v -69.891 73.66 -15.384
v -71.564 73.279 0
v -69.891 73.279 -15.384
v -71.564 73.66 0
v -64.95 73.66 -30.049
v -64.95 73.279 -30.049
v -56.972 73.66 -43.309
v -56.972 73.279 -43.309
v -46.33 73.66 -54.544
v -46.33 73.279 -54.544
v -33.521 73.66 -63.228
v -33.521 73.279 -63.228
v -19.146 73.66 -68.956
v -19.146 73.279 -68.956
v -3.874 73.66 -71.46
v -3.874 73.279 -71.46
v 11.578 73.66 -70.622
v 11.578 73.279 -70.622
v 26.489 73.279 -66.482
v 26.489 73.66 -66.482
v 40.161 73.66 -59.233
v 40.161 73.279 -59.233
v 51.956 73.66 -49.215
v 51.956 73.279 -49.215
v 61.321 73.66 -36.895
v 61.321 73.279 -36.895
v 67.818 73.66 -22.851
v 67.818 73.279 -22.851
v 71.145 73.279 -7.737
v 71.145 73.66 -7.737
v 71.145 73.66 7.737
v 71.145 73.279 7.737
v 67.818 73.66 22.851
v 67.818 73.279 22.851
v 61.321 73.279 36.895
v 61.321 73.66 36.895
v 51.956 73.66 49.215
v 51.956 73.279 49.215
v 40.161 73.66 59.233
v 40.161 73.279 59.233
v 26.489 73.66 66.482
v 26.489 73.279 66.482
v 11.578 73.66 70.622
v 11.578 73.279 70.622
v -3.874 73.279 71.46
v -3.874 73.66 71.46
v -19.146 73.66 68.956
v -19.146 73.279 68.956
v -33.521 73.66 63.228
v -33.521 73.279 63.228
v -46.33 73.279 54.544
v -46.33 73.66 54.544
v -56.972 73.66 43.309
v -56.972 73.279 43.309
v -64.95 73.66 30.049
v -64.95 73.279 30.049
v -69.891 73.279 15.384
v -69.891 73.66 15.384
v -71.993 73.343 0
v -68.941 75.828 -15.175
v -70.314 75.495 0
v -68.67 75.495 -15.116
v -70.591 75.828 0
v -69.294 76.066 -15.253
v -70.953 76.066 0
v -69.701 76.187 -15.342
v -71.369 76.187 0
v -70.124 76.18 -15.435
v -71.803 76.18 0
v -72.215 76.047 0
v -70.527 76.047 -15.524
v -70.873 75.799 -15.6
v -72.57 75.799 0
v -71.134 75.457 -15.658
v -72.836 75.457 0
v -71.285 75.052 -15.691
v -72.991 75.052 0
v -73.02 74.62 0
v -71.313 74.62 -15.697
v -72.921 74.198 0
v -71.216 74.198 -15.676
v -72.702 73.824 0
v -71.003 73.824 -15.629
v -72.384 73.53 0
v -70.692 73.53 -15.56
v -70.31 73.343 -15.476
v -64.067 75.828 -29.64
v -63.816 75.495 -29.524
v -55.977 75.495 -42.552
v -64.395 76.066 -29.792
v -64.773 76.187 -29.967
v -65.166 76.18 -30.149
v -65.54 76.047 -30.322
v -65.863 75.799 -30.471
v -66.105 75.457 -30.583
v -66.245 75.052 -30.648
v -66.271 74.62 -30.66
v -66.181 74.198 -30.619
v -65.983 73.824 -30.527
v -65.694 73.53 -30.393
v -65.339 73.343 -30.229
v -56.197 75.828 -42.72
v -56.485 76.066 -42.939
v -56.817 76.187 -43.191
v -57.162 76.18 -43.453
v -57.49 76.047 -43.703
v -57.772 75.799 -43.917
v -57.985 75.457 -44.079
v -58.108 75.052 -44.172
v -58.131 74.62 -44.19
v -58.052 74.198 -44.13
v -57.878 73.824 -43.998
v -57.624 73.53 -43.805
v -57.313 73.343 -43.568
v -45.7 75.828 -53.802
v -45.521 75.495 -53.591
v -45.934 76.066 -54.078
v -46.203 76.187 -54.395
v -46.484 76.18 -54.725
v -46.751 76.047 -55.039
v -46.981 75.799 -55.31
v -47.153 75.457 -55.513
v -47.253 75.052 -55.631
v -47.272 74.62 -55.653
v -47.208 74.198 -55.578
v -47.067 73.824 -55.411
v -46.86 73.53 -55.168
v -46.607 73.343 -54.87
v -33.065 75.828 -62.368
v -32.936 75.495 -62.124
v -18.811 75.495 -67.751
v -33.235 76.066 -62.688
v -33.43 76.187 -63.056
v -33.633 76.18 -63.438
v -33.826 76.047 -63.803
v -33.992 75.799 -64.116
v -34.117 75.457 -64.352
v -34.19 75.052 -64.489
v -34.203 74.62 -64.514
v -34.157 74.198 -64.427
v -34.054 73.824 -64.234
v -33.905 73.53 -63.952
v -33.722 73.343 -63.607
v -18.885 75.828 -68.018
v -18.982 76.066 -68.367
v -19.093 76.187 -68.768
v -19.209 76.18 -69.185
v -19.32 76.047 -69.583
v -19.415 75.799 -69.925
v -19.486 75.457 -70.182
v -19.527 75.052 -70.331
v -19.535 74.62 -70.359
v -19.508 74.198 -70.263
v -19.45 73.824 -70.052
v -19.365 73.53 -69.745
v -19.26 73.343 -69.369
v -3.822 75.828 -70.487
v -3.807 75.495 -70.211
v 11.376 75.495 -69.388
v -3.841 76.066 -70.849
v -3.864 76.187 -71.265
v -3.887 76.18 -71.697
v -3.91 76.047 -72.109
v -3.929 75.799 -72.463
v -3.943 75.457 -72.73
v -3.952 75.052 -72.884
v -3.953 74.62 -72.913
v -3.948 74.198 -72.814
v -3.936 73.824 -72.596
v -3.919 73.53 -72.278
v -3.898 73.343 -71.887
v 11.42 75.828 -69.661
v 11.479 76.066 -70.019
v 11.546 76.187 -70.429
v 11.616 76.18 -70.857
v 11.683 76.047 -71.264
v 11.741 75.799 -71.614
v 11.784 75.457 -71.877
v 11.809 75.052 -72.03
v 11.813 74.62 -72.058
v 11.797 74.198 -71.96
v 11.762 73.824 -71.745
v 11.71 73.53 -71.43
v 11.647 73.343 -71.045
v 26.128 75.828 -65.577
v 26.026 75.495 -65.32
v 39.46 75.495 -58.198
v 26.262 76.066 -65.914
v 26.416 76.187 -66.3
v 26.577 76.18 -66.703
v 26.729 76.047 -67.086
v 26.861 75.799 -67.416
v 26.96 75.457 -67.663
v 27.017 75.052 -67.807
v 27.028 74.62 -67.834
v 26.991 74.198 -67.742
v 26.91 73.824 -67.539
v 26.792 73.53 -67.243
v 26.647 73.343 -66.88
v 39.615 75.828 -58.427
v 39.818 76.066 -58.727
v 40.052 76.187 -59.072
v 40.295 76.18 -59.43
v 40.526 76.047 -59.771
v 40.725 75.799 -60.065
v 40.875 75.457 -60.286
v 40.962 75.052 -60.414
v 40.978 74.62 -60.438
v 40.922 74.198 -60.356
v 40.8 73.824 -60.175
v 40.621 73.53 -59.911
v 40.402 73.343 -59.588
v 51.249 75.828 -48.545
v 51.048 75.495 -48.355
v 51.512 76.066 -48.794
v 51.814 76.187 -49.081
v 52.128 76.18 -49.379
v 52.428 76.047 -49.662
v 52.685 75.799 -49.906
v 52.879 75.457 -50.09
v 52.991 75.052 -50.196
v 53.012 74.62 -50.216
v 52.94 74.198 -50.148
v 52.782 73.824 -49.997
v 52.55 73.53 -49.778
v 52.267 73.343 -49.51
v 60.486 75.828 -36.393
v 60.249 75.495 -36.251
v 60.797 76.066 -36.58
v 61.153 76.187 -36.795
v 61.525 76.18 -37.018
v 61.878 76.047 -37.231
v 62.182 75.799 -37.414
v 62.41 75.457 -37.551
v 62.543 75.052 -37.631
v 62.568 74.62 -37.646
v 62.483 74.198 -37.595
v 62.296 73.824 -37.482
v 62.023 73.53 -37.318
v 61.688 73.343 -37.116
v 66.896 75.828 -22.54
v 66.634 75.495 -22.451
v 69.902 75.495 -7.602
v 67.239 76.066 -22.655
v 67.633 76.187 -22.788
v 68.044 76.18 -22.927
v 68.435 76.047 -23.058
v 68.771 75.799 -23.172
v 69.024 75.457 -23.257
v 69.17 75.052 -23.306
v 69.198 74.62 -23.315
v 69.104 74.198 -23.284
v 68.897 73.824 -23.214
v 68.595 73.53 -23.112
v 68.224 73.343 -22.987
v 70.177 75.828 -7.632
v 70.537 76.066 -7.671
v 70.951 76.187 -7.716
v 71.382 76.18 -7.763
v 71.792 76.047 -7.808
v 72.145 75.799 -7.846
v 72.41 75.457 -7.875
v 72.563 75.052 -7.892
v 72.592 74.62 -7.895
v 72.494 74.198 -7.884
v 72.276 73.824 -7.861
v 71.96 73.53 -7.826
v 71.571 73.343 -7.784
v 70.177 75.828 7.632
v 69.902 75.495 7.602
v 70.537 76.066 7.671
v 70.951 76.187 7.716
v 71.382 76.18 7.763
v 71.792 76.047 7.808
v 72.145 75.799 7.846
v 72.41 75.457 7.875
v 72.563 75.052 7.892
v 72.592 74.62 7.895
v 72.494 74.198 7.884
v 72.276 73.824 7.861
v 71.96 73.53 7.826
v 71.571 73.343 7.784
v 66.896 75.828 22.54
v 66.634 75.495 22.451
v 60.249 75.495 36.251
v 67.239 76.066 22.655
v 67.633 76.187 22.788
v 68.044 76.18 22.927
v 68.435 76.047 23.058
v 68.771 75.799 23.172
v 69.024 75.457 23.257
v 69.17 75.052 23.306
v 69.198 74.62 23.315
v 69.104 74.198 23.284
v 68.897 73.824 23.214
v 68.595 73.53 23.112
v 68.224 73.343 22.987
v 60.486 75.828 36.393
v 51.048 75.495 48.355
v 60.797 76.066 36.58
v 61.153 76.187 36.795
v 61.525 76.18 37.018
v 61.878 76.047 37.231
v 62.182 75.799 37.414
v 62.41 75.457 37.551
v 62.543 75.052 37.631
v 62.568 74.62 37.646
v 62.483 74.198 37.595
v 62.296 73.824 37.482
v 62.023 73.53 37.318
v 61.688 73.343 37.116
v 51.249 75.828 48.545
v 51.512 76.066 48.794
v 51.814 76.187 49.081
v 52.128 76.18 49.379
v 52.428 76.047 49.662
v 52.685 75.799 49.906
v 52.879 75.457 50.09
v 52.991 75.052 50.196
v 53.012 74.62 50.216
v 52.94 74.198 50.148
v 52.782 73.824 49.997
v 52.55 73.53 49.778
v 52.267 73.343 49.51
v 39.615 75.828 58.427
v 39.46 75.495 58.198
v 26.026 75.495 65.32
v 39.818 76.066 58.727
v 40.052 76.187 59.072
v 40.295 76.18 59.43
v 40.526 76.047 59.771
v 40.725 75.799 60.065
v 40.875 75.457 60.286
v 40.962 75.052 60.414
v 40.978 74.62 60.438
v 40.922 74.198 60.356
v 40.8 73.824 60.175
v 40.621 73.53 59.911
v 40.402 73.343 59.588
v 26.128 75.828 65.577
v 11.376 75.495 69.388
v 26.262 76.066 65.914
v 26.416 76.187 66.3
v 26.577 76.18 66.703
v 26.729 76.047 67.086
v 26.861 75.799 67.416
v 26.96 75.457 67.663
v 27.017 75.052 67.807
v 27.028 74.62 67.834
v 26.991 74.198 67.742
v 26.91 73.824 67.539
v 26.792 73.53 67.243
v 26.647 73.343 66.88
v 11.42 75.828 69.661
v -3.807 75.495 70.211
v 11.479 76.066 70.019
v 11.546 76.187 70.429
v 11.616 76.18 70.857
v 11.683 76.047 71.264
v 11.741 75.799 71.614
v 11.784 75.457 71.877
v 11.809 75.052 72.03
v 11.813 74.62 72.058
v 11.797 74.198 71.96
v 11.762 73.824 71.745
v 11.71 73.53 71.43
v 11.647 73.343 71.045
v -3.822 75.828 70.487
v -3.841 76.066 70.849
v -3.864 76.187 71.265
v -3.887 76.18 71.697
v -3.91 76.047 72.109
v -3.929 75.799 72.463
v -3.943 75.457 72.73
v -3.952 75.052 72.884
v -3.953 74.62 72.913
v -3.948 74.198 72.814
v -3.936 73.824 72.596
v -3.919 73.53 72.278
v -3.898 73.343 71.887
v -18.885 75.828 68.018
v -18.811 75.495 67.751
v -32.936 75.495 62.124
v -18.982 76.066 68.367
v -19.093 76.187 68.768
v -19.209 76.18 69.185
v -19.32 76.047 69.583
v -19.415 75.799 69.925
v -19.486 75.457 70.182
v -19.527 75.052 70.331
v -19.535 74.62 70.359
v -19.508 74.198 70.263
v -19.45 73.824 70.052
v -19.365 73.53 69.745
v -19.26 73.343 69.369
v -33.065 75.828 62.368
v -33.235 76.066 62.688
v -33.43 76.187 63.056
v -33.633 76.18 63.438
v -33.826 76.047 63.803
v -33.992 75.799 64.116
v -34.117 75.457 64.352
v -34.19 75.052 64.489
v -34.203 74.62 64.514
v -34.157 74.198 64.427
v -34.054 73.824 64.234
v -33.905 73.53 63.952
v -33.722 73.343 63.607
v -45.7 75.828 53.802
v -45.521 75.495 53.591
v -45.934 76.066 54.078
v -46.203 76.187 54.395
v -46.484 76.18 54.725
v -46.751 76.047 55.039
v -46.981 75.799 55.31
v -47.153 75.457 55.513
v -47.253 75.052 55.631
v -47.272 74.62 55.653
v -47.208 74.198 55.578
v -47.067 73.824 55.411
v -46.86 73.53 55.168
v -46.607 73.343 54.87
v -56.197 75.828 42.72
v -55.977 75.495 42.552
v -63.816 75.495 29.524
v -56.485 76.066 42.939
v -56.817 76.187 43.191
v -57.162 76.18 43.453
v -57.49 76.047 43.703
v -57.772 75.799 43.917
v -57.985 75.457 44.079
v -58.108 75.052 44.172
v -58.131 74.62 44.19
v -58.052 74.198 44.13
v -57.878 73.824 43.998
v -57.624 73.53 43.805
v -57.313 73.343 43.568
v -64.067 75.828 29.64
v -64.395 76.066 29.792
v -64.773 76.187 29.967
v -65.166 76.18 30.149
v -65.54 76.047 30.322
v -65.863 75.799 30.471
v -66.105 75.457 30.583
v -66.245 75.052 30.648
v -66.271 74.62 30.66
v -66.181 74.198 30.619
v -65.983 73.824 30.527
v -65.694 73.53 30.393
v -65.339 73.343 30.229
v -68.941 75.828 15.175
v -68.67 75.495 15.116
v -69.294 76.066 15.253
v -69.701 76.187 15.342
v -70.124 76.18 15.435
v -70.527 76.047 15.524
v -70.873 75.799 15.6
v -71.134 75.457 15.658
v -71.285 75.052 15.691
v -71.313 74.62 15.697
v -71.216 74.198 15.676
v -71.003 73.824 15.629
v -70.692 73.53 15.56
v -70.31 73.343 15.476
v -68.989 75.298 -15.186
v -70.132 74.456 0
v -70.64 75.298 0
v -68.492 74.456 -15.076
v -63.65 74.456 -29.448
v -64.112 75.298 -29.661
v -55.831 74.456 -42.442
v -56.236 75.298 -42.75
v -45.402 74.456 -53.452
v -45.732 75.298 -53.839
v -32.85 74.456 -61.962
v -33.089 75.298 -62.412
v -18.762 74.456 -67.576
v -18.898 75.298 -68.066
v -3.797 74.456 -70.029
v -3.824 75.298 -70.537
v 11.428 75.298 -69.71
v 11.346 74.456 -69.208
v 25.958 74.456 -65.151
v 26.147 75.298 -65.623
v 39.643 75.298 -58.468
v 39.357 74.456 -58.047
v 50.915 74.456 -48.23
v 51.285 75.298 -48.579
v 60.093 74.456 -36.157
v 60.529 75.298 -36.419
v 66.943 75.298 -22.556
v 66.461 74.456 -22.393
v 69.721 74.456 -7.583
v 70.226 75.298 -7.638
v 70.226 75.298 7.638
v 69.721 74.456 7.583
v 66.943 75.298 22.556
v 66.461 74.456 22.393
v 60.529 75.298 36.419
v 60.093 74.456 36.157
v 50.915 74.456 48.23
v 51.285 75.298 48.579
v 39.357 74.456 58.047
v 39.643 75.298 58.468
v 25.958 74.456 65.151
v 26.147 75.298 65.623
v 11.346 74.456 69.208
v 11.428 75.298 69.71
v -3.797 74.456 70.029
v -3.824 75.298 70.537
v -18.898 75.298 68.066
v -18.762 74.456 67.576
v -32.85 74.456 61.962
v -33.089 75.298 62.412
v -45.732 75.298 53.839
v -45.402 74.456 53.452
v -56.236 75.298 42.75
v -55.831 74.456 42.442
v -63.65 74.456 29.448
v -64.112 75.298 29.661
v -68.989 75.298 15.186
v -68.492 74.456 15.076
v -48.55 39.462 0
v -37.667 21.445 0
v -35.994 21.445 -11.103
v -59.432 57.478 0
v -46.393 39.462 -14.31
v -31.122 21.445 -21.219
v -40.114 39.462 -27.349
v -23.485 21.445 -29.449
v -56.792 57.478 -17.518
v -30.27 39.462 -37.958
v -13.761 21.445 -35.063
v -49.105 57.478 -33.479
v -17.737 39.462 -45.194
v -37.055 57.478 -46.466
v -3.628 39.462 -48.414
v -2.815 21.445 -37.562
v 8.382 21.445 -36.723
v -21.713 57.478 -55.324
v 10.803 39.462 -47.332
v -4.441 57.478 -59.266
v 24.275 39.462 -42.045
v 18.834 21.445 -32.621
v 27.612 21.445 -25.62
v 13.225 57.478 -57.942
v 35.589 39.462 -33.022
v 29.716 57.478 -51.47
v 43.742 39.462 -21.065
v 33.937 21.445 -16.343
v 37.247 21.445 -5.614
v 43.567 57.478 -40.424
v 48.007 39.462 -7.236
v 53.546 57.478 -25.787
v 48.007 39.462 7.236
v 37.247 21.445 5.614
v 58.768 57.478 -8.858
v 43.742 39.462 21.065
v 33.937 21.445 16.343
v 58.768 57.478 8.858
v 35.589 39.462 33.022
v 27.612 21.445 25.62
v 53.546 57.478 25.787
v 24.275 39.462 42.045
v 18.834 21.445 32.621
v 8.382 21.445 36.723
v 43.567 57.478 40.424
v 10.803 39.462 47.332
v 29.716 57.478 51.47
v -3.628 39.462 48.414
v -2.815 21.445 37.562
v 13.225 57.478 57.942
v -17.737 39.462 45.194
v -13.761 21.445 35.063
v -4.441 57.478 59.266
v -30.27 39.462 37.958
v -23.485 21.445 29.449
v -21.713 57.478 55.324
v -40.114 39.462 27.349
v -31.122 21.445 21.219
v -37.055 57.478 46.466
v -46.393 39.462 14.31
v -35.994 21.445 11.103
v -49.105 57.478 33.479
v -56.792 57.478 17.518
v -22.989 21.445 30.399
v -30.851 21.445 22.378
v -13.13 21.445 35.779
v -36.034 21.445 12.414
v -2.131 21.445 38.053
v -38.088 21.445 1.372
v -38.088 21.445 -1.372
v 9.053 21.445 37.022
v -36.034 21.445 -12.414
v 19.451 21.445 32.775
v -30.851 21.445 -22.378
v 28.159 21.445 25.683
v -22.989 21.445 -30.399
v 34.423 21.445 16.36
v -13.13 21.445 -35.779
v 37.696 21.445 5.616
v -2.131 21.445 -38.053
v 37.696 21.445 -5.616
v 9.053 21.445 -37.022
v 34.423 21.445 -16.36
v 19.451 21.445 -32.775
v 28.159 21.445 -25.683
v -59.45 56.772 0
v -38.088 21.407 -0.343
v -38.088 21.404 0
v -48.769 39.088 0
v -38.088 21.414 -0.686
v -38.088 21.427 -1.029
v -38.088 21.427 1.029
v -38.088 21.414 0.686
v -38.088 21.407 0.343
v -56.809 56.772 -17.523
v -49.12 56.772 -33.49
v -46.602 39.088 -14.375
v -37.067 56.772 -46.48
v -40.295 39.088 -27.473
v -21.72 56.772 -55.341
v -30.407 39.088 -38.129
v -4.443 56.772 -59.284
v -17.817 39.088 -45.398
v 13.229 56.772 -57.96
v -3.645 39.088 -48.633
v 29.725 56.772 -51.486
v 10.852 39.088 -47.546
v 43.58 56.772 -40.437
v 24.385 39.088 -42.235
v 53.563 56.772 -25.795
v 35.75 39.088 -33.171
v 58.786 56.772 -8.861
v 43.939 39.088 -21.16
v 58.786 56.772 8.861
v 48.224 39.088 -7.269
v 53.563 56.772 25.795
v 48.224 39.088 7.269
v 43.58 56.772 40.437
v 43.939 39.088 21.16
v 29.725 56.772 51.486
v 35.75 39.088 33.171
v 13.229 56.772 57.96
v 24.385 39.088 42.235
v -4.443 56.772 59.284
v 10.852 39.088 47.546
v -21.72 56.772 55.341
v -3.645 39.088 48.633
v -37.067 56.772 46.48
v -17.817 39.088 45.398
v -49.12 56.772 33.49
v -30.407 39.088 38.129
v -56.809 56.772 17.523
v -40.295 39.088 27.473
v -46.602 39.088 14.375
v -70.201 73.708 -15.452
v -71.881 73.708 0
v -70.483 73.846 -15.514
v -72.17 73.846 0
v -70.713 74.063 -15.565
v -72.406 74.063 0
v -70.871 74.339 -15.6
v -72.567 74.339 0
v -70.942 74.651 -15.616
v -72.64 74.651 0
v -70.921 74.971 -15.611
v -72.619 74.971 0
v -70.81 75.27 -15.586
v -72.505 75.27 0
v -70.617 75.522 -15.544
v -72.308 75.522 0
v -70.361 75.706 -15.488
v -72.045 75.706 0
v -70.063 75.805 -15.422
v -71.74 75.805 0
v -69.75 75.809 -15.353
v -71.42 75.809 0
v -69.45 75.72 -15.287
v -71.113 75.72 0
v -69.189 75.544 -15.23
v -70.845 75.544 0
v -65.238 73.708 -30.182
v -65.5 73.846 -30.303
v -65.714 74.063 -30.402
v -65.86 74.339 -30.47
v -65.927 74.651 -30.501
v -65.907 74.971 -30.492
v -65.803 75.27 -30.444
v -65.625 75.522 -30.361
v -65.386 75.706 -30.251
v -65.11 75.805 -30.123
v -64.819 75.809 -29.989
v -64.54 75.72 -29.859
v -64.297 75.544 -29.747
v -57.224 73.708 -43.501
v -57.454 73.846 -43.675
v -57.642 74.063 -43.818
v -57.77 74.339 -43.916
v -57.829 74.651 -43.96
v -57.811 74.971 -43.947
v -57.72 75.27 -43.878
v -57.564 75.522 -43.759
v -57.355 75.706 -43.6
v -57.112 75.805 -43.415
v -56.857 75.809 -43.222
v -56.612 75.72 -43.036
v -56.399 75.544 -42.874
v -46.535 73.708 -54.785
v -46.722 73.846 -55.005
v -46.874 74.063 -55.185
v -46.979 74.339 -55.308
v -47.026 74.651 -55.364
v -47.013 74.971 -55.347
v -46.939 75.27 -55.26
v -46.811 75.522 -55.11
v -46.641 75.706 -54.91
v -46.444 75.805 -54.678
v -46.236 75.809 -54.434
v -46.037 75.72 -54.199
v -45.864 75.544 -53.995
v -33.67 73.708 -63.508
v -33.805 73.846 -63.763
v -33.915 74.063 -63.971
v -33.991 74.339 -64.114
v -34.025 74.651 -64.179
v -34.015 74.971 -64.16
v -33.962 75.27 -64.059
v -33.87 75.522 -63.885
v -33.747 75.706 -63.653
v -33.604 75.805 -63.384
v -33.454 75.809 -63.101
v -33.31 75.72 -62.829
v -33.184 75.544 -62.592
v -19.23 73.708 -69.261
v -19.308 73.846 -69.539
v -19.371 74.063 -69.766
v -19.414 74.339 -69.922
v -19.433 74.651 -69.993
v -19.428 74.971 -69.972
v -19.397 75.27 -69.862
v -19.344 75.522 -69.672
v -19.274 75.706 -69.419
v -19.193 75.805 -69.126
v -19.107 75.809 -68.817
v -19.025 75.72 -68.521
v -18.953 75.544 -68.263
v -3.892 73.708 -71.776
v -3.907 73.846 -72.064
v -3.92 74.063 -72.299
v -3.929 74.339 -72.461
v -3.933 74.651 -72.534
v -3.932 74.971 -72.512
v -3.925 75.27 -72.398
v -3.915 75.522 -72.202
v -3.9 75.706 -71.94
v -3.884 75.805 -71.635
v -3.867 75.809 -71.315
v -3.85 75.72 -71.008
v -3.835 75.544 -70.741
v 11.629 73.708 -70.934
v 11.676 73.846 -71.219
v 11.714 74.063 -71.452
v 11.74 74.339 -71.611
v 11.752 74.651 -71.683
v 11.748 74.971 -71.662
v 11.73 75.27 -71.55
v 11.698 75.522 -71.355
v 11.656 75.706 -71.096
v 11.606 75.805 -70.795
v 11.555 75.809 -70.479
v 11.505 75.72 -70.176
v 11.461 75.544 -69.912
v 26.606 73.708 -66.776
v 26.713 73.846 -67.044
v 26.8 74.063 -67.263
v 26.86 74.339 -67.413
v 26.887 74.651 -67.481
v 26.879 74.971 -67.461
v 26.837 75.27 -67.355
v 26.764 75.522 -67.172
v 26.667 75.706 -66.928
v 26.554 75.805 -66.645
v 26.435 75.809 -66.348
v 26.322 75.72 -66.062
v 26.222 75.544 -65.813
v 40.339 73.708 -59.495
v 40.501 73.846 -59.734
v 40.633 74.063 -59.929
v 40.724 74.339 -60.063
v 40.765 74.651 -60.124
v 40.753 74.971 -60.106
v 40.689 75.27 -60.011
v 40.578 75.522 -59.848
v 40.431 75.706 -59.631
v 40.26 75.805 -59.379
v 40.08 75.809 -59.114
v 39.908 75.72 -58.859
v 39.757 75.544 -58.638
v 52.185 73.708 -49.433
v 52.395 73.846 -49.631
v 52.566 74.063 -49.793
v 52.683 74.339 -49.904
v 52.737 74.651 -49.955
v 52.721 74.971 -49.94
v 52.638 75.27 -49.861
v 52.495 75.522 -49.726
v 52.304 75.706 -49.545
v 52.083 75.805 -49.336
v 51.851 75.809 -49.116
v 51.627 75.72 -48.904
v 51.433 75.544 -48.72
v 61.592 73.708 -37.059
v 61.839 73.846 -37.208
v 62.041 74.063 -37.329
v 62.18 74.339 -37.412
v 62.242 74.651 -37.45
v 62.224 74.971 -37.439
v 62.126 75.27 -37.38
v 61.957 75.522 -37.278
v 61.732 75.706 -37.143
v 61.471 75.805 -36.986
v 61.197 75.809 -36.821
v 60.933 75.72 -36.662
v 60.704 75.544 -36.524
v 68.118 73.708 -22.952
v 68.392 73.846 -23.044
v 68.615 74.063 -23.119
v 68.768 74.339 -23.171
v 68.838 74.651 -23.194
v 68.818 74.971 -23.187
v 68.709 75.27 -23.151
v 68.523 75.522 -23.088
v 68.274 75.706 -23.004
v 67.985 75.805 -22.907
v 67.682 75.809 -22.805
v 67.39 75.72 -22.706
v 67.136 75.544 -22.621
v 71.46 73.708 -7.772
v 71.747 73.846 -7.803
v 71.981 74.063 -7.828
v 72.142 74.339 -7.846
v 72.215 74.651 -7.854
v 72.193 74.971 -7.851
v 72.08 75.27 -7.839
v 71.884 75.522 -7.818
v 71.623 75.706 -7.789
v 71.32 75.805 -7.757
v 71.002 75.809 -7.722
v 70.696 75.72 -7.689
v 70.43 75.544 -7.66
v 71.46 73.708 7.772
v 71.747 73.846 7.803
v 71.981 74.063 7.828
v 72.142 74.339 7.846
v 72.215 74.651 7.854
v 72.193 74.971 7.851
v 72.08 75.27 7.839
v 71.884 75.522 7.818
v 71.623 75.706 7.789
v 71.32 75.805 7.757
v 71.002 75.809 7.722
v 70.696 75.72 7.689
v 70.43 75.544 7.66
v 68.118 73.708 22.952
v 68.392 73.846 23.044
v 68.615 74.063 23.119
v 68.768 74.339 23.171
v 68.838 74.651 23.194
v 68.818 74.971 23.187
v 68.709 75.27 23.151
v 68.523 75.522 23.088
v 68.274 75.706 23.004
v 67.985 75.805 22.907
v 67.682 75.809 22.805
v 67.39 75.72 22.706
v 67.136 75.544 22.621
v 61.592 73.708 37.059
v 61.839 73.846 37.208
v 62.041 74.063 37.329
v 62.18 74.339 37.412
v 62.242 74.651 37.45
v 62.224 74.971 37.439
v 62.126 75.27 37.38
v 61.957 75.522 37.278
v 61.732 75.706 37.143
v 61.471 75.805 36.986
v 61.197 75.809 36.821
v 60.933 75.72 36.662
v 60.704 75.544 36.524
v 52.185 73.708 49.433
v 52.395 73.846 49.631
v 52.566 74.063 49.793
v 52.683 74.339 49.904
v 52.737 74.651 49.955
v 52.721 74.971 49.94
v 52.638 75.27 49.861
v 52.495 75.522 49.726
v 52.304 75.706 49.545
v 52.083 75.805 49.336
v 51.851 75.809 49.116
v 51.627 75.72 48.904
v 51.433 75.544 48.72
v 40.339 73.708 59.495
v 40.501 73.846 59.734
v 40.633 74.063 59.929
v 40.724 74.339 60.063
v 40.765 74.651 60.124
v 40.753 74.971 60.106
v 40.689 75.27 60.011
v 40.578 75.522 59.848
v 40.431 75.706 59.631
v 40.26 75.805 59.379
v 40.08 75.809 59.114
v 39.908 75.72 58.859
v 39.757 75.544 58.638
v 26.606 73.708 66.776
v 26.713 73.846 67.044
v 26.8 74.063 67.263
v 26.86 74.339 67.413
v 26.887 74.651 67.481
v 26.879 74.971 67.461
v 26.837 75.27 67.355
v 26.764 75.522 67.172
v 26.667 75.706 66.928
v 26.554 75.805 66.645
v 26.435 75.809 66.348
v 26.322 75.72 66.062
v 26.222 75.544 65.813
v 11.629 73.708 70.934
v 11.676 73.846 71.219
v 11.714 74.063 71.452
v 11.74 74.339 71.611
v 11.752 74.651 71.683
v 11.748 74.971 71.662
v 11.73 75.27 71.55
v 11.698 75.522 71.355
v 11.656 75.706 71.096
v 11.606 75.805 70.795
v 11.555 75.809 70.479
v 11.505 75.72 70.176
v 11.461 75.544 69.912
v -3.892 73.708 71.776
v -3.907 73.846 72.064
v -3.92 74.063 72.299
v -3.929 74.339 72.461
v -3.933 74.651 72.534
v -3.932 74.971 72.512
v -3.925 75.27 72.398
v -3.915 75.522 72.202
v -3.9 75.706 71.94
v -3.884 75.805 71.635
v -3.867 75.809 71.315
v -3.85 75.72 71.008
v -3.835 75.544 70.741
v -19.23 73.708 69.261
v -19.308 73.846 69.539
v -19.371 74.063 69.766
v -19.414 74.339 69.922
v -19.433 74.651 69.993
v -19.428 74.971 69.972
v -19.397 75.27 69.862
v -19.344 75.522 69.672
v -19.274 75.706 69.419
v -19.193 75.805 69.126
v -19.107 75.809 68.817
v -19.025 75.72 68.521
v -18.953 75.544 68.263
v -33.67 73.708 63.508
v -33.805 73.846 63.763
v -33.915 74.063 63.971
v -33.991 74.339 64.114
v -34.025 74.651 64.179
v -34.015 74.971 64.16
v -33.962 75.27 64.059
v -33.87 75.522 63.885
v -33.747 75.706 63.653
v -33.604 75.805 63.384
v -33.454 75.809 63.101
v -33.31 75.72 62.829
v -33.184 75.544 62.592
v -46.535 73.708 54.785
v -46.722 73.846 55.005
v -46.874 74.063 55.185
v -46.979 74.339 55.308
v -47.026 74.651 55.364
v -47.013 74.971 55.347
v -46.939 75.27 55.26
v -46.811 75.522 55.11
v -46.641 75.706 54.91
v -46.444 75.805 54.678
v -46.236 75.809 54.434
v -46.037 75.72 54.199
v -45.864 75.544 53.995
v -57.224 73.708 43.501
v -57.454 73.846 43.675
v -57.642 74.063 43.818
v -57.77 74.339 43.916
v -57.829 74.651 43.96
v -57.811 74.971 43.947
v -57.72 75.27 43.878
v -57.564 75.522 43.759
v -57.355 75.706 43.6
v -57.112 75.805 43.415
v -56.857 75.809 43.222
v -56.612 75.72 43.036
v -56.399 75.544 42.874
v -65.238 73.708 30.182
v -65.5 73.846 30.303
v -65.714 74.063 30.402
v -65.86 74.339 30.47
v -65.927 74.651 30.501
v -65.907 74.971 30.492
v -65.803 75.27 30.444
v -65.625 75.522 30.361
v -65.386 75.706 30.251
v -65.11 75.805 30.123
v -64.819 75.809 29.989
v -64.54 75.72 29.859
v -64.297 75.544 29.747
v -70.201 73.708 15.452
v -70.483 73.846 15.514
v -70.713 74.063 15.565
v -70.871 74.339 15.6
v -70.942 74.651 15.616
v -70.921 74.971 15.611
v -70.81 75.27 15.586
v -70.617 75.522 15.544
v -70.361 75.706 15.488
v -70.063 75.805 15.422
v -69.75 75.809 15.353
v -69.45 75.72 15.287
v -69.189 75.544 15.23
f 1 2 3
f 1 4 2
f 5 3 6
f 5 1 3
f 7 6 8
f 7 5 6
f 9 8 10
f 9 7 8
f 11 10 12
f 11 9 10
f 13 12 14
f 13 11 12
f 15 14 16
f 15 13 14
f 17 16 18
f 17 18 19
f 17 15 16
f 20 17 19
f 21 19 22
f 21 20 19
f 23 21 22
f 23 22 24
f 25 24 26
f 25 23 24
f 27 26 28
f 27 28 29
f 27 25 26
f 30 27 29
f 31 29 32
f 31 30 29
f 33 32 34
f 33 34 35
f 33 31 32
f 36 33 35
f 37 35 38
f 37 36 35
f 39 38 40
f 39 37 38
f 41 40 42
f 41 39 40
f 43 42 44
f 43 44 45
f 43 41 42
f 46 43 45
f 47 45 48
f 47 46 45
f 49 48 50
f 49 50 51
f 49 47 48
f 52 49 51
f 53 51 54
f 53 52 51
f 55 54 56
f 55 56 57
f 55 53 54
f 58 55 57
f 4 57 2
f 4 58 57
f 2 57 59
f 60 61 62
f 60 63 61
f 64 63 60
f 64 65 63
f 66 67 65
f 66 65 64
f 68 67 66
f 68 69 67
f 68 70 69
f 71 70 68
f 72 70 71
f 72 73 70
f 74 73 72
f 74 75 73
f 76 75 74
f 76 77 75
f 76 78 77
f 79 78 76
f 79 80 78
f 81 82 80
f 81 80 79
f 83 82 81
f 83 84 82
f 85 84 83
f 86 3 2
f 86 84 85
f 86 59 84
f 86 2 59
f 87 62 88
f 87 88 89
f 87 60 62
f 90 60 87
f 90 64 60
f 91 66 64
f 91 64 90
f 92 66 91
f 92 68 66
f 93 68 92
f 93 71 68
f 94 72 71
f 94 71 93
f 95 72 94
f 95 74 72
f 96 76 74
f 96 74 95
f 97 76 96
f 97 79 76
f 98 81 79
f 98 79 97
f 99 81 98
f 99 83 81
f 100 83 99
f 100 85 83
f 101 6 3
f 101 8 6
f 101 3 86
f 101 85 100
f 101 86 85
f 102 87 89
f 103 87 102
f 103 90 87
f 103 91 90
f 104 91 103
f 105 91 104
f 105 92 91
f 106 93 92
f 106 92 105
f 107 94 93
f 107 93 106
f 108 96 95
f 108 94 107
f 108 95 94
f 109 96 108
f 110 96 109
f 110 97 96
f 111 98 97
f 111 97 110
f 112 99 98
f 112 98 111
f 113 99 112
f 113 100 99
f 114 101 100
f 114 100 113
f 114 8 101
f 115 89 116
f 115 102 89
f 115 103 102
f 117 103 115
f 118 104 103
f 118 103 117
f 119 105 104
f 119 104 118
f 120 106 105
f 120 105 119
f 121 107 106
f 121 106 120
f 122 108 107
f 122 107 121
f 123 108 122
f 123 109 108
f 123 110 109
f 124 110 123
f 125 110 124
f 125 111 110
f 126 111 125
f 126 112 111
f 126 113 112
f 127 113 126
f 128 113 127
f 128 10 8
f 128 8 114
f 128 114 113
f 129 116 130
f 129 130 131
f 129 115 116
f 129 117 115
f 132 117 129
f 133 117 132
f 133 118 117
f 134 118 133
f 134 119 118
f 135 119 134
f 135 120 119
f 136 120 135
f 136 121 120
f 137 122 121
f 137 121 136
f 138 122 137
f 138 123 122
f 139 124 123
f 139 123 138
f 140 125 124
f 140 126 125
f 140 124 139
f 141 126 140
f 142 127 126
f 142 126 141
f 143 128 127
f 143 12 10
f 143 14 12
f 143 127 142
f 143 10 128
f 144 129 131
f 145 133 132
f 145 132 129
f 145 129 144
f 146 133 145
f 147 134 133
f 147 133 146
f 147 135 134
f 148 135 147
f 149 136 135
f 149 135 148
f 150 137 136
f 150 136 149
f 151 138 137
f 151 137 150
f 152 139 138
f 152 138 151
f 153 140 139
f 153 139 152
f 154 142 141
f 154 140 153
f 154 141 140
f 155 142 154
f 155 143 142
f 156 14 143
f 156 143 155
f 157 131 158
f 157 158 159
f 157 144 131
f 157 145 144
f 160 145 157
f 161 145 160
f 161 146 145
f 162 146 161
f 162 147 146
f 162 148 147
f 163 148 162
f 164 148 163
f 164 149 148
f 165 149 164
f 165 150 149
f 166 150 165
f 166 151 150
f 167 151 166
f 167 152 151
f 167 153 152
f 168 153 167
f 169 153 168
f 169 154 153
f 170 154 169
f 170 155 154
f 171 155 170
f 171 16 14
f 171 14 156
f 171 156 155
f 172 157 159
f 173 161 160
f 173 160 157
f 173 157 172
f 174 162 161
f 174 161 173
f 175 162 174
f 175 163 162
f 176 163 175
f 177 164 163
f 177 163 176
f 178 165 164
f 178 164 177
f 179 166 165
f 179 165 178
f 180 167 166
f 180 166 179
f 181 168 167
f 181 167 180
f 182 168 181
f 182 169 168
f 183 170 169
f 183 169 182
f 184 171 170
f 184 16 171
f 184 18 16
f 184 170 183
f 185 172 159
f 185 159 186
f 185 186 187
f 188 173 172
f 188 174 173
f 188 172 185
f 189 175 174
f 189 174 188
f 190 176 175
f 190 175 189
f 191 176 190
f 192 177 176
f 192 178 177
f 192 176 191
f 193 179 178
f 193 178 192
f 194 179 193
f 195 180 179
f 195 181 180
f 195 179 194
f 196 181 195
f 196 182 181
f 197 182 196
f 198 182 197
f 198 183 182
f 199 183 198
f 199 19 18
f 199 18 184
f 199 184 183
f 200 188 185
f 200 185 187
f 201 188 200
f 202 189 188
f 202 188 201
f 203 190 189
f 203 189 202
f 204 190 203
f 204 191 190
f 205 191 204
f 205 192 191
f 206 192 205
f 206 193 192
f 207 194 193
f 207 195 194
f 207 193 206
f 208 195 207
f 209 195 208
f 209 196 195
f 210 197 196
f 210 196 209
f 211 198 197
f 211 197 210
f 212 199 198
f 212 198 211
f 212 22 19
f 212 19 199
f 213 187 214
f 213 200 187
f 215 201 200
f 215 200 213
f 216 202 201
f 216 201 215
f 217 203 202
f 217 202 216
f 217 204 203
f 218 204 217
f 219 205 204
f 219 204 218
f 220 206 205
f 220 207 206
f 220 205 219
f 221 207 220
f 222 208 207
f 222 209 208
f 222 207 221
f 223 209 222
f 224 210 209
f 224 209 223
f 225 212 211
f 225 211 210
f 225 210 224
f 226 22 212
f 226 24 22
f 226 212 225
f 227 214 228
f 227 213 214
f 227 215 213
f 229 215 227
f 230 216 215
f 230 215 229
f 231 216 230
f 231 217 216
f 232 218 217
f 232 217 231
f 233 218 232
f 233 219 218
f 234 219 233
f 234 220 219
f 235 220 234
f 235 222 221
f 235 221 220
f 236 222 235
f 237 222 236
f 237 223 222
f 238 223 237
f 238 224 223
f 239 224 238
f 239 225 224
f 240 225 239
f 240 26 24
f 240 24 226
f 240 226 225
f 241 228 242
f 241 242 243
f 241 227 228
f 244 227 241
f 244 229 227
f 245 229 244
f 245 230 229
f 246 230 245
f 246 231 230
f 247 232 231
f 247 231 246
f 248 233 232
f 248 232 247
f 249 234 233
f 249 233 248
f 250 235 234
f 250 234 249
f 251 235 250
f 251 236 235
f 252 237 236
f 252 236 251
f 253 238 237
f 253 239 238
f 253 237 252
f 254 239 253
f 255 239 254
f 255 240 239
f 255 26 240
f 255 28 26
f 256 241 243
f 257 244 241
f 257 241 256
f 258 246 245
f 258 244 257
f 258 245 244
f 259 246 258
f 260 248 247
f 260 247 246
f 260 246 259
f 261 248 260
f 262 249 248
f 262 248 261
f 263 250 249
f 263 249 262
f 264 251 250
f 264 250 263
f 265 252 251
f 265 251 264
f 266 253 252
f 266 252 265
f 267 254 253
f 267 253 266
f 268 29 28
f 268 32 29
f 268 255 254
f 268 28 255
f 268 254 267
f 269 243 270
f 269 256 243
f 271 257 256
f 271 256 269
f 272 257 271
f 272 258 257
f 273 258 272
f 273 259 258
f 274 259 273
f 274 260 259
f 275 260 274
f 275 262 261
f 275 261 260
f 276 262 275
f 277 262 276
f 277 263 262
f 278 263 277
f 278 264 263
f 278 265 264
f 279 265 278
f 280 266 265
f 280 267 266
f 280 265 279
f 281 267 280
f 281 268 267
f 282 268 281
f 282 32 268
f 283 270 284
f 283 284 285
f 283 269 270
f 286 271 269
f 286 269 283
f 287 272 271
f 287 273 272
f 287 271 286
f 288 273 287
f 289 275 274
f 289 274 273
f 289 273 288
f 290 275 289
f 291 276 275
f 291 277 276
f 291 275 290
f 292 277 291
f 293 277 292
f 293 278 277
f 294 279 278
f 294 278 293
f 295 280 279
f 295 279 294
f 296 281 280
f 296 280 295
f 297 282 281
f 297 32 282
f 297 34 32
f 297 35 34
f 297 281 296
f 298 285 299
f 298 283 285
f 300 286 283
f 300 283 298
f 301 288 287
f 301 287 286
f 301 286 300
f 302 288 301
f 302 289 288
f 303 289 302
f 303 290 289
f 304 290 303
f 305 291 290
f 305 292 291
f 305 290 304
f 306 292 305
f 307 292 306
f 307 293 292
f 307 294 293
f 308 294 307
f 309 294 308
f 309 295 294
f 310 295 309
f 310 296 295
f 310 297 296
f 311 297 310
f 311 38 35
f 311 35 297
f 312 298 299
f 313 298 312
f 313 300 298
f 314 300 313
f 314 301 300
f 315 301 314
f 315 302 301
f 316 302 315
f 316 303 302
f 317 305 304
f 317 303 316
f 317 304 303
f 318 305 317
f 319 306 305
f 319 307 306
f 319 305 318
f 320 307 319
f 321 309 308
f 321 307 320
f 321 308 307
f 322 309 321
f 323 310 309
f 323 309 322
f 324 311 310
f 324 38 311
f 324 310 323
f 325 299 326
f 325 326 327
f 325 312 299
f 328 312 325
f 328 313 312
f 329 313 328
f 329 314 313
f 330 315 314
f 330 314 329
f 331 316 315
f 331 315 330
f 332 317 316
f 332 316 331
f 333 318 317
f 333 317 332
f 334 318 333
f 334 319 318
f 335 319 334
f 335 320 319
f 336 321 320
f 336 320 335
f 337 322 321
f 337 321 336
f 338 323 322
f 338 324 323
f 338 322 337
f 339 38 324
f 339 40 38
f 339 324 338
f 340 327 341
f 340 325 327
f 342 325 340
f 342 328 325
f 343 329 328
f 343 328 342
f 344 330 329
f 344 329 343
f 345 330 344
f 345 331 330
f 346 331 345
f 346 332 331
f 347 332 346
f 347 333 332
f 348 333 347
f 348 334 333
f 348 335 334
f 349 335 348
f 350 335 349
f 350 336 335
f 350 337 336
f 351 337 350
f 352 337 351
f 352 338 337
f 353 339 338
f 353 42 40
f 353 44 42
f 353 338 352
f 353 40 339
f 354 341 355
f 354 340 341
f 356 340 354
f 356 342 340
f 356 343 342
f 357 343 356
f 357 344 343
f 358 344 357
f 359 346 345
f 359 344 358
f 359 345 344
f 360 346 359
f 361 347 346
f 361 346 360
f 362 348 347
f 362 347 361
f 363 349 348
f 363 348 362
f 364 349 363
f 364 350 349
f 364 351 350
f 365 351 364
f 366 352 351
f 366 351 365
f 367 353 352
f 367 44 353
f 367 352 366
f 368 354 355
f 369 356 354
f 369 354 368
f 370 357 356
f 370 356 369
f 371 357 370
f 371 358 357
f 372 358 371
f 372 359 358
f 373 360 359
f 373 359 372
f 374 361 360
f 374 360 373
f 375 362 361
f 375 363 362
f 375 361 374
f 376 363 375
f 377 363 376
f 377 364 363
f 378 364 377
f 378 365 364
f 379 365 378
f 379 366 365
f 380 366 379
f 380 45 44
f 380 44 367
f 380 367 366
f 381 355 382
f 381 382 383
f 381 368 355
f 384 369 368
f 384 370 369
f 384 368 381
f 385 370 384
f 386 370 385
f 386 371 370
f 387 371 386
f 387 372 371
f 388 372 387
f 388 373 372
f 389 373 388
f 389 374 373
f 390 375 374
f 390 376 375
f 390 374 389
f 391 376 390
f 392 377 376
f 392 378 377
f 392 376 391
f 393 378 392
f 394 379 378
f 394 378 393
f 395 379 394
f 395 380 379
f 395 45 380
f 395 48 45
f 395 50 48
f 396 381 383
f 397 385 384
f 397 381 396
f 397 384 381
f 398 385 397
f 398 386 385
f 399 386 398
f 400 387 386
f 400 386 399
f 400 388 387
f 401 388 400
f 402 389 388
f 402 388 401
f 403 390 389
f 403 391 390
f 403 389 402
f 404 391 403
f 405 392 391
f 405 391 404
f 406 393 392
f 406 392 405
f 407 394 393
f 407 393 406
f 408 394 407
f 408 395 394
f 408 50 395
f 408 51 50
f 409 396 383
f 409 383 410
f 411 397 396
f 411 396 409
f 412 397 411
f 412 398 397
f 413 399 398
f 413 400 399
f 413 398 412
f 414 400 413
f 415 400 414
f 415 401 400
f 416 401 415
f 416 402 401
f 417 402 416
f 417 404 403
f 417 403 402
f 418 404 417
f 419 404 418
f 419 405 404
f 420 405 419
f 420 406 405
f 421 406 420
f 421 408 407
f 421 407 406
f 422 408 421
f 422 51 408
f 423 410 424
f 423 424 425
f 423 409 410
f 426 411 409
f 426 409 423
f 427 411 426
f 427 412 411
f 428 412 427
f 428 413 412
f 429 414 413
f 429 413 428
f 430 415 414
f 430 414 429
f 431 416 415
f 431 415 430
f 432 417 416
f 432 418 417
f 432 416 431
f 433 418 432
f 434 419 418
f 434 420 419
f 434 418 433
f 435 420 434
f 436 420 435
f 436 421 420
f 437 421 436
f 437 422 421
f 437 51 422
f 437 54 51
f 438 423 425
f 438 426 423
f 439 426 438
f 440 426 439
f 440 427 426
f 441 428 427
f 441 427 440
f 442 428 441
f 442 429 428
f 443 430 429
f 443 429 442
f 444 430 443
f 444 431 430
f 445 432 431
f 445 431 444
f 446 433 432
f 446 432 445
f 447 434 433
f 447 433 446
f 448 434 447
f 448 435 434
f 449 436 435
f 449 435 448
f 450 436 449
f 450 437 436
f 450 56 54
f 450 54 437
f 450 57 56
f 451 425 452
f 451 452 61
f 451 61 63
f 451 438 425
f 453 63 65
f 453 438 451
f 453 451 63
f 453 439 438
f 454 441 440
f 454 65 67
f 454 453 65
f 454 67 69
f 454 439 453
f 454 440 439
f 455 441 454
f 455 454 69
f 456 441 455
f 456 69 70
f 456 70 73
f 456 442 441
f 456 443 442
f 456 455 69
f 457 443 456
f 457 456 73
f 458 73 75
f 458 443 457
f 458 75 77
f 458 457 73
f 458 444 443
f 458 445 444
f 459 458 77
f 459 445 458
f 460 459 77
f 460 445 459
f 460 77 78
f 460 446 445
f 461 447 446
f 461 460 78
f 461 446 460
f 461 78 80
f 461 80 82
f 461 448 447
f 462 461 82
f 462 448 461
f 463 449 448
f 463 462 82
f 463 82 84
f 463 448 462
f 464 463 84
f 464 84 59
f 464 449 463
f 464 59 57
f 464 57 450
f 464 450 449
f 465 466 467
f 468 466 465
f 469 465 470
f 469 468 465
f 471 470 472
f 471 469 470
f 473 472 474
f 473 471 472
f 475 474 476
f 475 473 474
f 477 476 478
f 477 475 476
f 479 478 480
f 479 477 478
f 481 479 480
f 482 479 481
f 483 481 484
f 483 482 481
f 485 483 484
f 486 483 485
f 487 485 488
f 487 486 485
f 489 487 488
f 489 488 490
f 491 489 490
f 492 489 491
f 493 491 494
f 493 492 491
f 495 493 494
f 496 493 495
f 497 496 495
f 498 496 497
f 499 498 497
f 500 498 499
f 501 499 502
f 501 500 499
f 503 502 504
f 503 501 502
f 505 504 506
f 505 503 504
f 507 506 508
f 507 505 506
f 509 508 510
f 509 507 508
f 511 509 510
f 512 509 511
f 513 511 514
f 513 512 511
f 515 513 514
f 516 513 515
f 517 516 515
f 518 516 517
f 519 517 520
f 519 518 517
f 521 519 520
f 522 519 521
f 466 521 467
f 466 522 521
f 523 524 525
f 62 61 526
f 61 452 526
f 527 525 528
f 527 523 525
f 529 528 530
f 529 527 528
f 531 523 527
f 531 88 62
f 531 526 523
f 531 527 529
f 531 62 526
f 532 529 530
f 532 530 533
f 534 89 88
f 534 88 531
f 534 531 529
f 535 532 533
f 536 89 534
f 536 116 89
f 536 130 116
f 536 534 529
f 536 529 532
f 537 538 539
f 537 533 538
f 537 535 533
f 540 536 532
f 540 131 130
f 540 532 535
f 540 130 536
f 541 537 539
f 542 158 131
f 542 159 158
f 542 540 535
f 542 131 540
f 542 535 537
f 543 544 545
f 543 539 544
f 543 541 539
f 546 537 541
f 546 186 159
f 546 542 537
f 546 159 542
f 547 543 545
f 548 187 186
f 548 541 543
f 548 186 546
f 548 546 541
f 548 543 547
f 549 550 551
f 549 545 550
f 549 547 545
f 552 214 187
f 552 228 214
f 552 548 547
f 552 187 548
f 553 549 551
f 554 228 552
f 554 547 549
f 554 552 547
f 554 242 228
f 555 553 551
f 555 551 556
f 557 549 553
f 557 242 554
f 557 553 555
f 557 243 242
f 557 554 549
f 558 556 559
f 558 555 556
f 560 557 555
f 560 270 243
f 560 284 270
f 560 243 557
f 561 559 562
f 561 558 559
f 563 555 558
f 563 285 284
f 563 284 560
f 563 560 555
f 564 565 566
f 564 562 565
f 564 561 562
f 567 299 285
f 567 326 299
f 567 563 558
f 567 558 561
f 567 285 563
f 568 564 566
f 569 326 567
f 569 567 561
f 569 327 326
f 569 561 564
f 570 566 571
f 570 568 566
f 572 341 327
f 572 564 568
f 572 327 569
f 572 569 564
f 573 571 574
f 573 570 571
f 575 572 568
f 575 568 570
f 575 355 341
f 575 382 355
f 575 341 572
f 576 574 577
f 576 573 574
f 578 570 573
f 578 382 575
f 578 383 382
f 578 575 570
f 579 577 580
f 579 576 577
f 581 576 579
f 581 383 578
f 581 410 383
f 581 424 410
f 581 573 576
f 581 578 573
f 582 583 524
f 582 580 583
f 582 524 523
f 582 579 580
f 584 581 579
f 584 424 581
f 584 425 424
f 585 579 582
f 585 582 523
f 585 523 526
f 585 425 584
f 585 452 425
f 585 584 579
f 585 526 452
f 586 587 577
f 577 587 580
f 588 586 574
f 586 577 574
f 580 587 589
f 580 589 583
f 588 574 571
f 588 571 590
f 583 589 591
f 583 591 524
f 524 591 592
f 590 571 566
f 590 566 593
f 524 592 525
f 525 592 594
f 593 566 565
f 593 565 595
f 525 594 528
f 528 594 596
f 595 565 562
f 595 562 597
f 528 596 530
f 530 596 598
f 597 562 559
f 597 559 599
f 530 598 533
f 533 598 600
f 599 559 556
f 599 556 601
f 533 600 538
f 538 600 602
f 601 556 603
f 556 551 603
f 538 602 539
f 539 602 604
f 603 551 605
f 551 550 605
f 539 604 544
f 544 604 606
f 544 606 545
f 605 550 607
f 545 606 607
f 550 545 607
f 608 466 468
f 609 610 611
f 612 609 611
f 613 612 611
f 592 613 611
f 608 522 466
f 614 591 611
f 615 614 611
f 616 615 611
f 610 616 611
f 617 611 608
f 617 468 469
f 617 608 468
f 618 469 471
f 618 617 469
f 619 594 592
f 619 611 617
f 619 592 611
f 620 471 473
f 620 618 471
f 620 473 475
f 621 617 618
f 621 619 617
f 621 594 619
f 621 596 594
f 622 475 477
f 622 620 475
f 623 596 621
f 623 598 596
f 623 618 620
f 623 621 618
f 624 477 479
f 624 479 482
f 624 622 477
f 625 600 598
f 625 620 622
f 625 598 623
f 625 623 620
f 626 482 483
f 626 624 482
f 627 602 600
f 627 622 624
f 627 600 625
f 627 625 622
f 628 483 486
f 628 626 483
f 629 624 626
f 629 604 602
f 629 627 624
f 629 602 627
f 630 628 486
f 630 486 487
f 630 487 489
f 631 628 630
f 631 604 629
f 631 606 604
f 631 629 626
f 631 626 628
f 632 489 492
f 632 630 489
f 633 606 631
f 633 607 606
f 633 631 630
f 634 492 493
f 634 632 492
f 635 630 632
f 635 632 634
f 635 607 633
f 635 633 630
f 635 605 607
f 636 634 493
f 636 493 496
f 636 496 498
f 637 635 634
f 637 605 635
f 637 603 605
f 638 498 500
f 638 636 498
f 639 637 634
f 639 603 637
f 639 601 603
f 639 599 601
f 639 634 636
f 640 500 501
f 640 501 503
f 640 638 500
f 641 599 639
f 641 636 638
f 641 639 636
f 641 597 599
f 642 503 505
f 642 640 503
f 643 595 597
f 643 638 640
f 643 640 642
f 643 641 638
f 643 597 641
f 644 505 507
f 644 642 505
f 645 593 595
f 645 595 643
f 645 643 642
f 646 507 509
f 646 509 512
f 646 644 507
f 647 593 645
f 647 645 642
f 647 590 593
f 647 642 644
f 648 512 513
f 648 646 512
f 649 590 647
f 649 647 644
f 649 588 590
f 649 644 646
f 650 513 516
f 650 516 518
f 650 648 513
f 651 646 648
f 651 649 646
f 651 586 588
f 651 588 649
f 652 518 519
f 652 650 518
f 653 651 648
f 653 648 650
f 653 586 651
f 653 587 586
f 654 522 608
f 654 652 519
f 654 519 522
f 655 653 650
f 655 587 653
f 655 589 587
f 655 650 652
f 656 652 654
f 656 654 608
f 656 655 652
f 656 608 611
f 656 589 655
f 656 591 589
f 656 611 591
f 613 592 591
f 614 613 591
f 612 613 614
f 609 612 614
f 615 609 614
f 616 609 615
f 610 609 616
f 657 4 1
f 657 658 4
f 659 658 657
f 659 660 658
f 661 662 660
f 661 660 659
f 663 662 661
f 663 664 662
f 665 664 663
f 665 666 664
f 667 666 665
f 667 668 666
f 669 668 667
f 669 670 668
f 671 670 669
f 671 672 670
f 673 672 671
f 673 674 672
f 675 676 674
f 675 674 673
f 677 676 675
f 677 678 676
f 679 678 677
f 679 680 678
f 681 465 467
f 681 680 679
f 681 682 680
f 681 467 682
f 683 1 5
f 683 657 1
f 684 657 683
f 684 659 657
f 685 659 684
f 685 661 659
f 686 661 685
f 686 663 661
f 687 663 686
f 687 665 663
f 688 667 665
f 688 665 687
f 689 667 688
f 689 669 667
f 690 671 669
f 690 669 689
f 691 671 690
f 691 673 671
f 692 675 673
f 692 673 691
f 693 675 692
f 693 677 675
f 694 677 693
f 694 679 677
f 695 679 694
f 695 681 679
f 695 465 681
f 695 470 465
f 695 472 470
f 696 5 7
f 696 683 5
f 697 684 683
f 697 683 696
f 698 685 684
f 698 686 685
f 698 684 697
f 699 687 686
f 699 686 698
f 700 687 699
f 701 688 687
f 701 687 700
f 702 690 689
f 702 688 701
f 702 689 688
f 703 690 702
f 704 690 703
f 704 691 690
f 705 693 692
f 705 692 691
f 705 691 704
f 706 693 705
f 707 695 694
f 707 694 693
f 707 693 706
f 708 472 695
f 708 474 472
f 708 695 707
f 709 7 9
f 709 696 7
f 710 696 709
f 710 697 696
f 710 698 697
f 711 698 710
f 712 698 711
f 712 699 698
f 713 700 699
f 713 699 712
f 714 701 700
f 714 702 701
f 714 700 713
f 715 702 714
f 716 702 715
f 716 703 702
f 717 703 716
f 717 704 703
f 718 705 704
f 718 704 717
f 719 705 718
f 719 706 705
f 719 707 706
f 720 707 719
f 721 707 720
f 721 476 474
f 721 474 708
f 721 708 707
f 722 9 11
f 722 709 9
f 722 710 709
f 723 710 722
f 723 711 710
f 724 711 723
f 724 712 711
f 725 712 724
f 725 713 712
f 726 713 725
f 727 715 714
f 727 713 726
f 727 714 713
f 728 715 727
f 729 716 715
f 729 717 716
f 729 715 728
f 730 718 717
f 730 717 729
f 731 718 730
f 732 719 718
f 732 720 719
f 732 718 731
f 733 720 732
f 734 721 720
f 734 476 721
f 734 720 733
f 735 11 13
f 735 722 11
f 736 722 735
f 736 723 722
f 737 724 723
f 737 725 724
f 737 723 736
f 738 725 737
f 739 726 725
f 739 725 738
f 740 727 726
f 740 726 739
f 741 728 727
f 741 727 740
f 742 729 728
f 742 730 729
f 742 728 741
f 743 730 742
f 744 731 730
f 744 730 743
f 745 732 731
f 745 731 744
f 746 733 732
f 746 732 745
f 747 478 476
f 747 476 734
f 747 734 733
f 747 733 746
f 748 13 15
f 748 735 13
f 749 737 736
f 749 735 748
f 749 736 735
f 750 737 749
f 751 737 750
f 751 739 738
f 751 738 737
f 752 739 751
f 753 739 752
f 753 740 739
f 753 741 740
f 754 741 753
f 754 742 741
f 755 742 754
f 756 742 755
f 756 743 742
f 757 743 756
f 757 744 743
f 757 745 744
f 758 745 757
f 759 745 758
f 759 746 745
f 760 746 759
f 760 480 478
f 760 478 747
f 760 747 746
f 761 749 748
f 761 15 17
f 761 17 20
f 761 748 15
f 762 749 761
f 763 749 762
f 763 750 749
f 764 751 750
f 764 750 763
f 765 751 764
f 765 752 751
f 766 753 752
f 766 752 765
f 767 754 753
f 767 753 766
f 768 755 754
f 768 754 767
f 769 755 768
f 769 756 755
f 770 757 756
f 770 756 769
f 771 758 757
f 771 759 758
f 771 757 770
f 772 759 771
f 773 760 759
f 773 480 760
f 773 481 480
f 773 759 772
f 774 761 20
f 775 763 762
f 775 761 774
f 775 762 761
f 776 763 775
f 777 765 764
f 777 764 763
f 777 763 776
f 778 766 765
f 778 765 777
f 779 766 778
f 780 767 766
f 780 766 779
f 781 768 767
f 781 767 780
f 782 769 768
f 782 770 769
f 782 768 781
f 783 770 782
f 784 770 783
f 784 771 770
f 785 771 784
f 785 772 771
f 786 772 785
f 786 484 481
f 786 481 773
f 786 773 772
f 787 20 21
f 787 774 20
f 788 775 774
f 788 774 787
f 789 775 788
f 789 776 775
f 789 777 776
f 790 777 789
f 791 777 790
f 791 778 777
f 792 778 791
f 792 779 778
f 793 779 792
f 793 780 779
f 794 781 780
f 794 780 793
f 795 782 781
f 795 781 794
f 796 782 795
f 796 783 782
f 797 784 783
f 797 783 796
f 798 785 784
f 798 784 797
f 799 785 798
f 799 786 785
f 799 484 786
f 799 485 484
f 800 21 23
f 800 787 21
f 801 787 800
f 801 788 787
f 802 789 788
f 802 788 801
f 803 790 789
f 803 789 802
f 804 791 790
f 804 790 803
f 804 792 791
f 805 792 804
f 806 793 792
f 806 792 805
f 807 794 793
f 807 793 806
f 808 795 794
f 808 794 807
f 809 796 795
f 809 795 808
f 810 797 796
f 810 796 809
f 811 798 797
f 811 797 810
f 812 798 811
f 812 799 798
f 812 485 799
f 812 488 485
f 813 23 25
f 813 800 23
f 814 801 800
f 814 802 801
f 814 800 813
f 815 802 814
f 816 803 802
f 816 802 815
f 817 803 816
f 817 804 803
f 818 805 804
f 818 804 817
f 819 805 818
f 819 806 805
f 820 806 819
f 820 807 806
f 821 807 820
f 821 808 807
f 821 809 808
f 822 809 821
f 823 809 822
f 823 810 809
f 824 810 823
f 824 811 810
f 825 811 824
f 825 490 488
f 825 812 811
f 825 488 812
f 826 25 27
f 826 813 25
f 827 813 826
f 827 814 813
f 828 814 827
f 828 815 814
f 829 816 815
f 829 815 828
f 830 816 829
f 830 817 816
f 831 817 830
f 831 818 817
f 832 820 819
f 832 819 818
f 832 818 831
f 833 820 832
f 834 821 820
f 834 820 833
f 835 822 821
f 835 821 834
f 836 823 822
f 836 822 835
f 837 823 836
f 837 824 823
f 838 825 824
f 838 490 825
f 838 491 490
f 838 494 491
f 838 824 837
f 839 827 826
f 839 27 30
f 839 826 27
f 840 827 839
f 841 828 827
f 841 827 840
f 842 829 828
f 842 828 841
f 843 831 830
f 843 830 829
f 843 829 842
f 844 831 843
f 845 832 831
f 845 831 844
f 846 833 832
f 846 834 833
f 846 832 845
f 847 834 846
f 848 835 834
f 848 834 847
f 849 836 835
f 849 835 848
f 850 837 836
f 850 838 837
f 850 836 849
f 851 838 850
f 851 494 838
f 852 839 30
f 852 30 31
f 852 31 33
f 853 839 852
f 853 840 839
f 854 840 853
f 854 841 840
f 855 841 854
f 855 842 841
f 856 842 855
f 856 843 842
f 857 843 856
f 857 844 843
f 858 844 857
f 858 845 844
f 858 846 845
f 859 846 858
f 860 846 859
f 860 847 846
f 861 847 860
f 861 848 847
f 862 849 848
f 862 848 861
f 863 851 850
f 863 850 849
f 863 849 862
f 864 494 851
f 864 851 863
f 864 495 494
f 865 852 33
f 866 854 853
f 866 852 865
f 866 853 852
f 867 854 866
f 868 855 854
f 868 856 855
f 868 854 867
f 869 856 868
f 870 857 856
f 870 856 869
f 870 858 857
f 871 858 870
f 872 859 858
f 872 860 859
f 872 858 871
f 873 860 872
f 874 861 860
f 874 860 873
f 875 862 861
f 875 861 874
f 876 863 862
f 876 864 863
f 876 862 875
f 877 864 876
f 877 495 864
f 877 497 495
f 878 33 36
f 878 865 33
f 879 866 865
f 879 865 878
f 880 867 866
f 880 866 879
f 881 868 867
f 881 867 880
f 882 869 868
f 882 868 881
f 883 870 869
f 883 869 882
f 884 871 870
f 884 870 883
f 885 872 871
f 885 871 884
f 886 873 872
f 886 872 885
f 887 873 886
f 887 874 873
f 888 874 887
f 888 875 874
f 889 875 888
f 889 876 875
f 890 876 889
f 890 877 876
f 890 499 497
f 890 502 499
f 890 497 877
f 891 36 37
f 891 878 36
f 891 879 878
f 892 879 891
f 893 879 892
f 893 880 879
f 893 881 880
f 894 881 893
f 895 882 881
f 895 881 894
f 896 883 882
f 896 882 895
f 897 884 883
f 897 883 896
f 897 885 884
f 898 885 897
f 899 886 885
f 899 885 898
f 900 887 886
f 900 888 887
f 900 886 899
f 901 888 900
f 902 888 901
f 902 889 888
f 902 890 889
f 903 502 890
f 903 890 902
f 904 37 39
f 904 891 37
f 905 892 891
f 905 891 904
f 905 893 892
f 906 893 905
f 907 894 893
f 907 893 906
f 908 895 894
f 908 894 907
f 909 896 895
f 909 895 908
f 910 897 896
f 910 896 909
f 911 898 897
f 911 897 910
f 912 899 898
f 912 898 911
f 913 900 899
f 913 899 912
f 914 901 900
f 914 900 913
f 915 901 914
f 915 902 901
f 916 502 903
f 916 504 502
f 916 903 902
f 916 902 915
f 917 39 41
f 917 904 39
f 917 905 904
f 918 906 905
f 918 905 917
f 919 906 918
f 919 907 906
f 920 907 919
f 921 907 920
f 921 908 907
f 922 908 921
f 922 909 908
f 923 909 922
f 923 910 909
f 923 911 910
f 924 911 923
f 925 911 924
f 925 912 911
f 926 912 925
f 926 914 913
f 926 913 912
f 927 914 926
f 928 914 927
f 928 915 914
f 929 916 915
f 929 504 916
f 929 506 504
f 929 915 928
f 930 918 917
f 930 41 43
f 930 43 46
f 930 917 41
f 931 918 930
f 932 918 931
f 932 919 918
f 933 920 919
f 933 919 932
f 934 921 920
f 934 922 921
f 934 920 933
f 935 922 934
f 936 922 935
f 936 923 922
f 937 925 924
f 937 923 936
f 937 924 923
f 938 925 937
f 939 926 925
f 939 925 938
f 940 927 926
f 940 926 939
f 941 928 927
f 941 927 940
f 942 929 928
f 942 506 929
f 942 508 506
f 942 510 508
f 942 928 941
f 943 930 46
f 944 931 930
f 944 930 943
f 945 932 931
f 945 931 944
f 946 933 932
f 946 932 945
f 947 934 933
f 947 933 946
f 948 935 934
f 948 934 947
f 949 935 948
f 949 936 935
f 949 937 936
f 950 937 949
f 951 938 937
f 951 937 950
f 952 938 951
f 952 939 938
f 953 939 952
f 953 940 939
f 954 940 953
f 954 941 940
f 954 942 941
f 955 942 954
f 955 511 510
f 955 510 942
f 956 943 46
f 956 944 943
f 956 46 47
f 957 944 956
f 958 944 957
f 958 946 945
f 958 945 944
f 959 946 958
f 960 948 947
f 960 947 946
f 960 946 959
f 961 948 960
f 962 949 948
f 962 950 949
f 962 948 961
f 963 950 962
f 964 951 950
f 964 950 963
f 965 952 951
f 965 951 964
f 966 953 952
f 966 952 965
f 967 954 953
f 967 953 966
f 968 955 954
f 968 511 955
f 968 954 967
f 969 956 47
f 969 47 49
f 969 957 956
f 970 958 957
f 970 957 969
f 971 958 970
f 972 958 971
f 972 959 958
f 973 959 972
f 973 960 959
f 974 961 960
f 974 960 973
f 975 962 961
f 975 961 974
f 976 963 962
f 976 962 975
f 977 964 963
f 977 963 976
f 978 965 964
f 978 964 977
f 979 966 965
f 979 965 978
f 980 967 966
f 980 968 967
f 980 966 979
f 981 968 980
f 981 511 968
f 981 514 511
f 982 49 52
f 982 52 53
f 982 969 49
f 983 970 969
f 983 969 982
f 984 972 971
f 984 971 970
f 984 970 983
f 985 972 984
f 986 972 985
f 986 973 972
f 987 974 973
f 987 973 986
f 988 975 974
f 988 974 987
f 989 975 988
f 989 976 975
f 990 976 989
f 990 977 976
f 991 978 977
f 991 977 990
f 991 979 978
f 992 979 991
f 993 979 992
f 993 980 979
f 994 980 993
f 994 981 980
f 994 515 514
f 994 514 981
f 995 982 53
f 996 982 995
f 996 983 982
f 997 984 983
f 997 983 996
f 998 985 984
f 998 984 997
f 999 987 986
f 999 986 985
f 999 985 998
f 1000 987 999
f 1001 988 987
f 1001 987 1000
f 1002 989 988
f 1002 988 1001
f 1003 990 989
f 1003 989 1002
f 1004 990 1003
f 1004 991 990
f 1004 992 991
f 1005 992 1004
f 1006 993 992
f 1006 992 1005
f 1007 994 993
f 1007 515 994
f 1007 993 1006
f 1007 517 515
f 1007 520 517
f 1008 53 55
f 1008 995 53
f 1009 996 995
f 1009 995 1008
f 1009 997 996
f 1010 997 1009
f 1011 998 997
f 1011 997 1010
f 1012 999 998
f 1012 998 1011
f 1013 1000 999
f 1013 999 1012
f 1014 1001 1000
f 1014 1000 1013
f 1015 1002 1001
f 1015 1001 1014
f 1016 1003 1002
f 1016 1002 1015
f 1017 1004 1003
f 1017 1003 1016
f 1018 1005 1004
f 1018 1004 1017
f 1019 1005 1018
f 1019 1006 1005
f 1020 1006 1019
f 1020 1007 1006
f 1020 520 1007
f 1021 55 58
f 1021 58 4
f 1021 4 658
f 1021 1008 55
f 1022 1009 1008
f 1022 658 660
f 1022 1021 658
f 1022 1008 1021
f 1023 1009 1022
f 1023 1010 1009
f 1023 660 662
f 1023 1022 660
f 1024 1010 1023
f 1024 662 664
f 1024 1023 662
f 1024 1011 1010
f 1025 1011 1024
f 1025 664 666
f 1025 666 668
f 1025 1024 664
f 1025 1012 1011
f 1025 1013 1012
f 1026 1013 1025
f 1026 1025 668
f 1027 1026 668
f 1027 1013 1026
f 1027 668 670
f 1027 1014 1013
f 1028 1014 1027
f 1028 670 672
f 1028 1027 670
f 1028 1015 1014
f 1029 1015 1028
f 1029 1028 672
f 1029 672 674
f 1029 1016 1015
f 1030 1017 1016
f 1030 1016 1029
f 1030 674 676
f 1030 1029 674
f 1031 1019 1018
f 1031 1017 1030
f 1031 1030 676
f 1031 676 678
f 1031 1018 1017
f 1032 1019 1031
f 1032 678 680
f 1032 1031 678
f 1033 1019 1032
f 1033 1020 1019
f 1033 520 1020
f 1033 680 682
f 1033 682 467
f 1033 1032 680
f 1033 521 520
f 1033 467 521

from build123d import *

# Parameters (mm, degrees)
FILLET1_R               = 2.54
SKETCH11_W              = 76.2
SKETCH11_H              = 114.3
CUT_EXTRUDE1_DEPTH      = 74.0250001
CUT_EXTRUDE1_DEPTH_BACK = 74.0250001


with BuildPart() as part:
    # Sketch3 → Revolve1 (revolve)
    with BuildSketch(Plane.XY):
        with BuildLine():
            Line((-71.5645, 73.279), (-71.5645, 73.66))
            ThreePointArc((-71.5645, 73.66), (-72.504664711, 75.269981447), (-70.640479738, 75.297627948))
            Line((-70.640479738, 75.297627948), (-70.13186321, 74.455577339))
            Line((-70.13186321, 74.455577339), (-13.6525, -19.05))
            Line((-13.6525, -19.05), (-12.065, -19.05))
            Line((-12.065, -19.05), (-12.1031, -18.669))
            Line((-12.1031, -18.669), (-13.437523381, -18.669))
            Line((-13.437523381, -18.669), (-70.31435494, 75.494614282))
            ThreePointArc((-70.31435494, 75.494614282), (-72.836487551, 75.457210193), (-71.5645, 73.279))
        make_face()
    revolve(axis=Axis((0, 76.2, 0), (0, -1, 0)))

    # Sketch4 → Revolve2 (revolve)
    with BuildSketch(Plane.XY):
        Polygon((-5.967099739, -76.2), (-11.682099739, -19.05), (-11.752974875, -18.341248634), (-13.635492197, -18.341248634), (-13.437523381, -18.669), (-12.1031, -18.669), (-12.065, -19.05), (-6.35, -76.2), align=None)
    revolve(axis=Axis((0, 76.2, 0), (0, -1, 0)))

    # Fillet1
    fillet1_edges = [part.edges().sort_by_distance(p)[0] for p in [
        (13.6525, -19.05, 0),
    ]]
    fillet(fillet1_edges, radius=FILLET1_R)

    # Sketch11 → Cut-Extrude1 (cut, two sides)
    with BuildSketch(Plane.XY) as cut_extrude1_sk:
        with Locations((0.012345185, -35.704997655)):
            Rectangle(SKETCH11_W, SKETCH11_H)
    extrude(amount=CUT_EXTRUDE1_DEPTH, mode=Mode.SUBTRACT)
    extrude(cut_extrude1_sk.sketch, amount=-CUT_EXTRUDE1_DEPTH_BACK, mode=Mode.SUBTRACT)


solid = part.part
